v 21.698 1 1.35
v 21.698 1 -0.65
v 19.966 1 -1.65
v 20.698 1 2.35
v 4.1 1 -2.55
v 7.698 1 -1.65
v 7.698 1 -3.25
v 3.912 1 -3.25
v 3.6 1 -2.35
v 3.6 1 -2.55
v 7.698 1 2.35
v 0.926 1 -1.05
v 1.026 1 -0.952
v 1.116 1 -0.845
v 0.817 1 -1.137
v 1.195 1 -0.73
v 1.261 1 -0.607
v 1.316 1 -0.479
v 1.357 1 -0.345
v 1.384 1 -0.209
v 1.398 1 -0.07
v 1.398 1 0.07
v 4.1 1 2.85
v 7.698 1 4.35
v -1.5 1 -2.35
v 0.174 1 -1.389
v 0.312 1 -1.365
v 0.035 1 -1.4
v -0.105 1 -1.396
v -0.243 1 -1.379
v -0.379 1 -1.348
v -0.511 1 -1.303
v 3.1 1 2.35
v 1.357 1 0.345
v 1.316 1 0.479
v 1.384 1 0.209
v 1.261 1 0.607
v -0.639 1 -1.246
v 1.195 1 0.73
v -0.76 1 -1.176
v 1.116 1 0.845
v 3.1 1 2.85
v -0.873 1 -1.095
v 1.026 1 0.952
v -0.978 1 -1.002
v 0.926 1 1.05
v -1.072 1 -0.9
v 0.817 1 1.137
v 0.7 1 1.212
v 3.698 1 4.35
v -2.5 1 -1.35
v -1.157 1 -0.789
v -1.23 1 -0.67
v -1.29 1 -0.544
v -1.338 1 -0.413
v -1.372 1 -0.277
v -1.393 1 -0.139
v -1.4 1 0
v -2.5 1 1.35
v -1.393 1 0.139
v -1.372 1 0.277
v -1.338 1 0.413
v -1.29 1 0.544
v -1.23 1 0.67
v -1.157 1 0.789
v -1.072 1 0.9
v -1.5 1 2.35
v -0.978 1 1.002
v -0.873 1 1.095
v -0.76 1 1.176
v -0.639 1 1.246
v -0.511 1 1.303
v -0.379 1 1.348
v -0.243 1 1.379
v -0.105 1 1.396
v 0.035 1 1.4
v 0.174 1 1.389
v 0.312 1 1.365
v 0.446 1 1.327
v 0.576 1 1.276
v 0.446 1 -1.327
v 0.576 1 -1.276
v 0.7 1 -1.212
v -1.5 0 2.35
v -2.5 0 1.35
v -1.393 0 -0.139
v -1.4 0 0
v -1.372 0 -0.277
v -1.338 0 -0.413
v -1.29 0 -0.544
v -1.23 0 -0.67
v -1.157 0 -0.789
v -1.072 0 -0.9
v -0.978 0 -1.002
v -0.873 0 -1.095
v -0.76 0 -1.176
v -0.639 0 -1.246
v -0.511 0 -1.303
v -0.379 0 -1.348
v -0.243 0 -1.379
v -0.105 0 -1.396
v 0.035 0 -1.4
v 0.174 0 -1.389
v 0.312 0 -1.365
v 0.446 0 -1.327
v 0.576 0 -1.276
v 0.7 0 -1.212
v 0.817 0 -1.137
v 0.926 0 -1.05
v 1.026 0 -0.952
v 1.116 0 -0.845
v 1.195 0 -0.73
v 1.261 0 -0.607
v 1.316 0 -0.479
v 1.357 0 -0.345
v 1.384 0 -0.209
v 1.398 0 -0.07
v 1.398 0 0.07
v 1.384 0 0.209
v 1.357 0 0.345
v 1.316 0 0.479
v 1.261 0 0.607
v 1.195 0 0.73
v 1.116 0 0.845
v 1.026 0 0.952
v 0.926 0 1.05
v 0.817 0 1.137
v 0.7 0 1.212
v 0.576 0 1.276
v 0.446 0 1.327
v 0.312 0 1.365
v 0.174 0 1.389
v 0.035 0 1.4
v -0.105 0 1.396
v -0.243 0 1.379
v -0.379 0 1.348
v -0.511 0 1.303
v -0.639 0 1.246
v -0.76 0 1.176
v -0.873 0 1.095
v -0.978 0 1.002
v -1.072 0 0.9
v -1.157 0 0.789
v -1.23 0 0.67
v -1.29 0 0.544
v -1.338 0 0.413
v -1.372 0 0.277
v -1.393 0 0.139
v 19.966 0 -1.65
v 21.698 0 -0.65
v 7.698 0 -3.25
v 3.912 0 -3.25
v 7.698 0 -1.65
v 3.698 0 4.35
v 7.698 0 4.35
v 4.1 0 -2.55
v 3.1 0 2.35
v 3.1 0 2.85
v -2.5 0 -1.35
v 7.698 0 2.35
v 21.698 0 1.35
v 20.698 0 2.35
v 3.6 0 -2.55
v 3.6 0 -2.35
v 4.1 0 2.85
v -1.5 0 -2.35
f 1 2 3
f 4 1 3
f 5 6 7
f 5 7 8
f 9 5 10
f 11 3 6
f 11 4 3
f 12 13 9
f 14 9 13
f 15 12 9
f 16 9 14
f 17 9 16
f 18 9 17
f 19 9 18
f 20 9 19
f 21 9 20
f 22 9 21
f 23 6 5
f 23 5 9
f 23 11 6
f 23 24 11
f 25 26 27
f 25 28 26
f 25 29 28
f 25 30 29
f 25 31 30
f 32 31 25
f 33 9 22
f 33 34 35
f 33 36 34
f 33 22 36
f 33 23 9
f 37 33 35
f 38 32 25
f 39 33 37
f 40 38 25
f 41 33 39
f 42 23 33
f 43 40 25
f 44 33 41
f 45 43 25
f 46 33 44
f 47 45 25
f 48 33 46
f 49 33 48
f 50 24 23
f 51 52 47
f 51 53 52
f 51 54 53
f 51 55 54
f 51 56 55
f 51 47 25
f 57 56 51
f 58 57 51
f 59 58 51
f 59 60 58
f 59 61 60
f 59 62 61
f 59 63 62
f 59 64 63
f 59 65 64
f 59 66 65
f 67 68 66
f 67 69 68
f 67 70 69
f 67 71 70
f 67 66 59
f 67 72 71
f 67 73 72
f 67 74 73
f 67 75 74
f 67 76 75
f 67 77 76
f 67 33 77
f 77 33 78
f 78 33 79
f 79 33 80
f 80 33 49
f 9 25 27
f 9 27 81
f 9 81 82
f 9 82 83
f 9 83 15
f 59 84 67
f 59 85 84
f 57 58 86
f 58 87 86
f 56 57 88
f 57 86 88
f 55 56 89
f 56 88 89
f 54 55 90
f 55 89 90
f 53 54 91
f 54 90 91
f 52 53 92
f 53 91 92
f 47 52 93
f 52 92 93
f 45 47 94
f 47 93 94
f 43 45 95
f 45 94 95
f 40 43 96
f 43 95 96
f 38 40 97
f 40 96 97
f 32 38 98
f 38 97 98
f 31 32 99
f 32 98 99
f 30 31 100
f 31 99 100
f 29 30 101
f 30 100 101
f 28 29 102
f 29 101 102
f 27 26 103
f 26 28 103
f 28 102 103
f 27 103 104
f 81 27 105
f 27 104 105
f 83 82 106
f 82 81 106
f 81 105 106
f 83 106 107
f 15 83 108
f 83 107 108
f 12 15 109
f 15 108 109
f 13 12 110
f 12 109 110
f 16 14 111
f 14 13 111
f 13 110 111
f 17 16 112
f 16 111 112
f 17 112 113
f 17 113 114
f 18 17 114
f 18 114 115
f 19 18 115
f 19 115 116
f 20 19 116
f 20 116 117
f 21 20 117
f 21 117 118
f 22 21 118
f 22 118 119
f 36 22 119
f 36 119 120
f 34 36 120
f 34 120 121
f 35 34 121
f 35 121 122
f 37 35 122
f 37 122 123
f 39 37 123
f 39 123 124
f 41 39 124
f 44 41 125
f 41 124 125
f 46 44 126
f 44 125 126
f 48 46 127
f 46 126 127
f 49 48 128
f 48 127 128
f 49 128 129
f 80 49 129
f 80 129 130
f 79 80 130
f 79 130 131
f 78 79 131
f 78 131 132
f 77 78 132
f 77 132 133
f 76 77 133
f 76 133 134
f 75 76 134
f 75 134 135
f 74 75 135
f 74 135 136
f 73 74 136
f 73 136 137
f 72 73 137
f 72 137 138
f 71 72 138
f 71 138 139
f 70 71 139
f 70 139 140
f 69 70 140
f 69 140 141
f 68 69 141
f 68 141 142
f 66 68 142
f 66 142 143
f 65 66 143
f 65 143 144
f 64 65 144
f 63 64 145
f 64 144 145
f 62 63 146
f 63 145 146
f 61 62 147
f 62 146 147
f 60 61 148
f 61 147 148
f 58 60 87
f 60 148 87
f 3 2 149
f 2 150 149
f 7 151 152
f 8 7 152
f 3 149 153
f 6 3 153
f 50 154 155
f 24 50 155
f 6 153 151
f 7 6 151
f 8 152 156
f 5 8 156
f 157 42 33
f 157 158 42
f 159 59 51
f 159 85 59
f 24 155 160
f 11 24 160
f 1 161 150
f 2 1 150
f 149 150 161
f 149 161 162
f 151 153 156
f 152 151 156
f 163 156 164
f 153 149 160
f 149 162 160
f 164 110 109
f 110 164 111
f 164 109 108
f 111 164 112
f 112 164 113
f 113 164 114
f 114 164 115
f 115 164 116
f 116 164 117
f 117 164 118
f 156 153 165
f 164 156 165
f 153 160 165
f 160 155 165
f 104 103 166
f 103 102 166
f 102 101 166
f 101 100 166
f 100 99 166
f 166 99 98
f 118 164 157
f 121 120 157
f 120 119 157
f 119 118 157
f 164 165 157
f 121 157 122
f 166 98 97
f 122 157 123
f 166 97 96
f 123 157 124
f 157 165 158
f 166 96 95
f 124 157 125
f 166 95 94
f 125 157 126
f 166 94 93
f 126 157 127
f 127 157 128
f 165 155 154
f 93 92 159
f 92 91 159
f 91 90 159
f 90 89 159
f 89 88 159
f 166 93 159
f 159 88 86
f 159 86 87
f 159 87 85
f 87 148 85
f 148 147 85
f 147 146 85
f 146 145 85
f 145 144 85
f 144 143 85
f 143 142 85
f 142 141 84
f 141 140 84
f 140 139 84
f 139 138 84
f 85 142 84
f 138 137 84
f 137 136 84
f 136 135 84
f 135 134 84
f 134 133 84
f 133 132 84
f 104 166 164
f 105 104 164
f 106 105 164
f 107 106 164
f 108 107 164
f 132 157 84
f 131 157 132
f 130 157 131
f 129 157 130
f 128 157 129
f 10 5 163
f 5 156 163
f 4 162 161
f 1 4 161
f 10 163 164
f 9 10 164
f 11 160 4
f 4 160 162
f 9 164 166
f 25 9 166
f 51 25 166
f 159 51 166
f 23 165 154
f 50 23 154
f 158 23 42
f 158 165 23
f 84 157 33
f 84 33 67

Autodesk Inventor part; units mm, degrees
ref_plane "YZ Plane" through (0, 0, 0) normal (1, 0, 0) x (0, 1, 0)
ref_plane "XZ Plane" through (0, 0, 0) normal (0, 1, 0) x (-1, 0, 0)
ref_plane "XY Plane" through (0, 0, 0) normal (0, 0, 1) x (1, 0, 0)
sketch "Sketch1" plane through (0, 0, 0) normal (0, 1, 0) x (-1, 0, 0)
  line L0 (-4.1, 2.85) -> (-3.1, 2.85)
  line L1 (-3.1, 2.85) -> (-3.1, 2.35)
  line L2 (-3.1, 2.35) -> (2.5, 2.35)
  line L3 (2.5, 2.35) -> (2.5, -2.35)
  line L4 (-4.1, 2.85) -> (-3.6981, 4.35)
  line L5 (-3.6981, 4.35) -> (-7.6981, 4.35)
  line L6 (-7.6981, 4.35) -> (-7.6981, 2.35)
  line L7 (-7.6981, 2.35) -> (-20.6981, 2.35)
  line L8 (-20.6981, 2.35) -> (-21.6981, 1.35)
  line L9 (-21.6981, 1.35) -> (-21.6981, -0.65)
  line L10 (-21.6981, -0.65) -> (-19.966, -1.65)
  line L11 (-19.966, -1.65) -> (-7.6981, -1.65)
  line L12 (-7.6981, -1.65) -> (-7.6981, -3.25)
  line L13 (-7.6981, -3.25) -> (-3.9124, -3.25)
  line L14 (-3.9124, -3.25) -> (-4.1, -2.55)
  line L15 (-4.1, -2.55) -> (-3.6, -2.55)
  line L16 (-3.6, -2.55) -> (-3.6, -2.35)
  line L17 (-3.6, -2.35) -> (2.5, -2.35)
  circle A0 centre (0, 0) radius 1.4
  dimension "d1" = 4
  dimension "d2" = 2
  dimension "d3" = 75
  dimension "d4" = 4.7
  dimension "d5" = 5.6
  dimension "d6" = 1
  dimension "d7" = 0.5
  dimension "d8" = 75
  dimension "d9" = 7.6
  dimension "d10" = 2
  dimension "d11" = 0.5
  dimension "d12" = 0.2
  dimension "d13" = 2.8
  dimension "d14" = 2.5
  dimension "d15" = 2.35
  dimension "d17" = 0
  dimension "d18" = 0
  dimension "d19" = 4
  dimension "d20" = 0
  dimension "d21" = 0
  dimension "d23" = 2
  dimension "d24" = 60
  dimension "d25" = 45
  dimension "d26" = 14
  dimension "d27" = 1
extrude "Plate1" add sketch "Sketch1" along normal blind 1
chamfer "Corner Chamfer1" distance 1 angle 45 2 edges at (-2.5, 0.5, 2.35) (-2.5, 0.5, -2.35)
equation "\"d8\" = d3"
equation "\"d15\" = 0.5 * d4"
equation "\"d31\" = Thickness"
equation "\"BendRadius\" = Thickness"
equation "\"BendReliefWidth\" = Thickness"
equation "\"BendReliefDepth\" = 0.5 * Thickness"
equation "\"CornerReliefSize\" = 4 * Thickness"
equation "\"MinimumRemnant\" = 2 * Thickness"
equation "\"TransitionRadius\" = BendRadius"
equation "\"JacobiRadiusSize\" = BendRadius"
equation "\"GapSize\" = Thickness"
equation "\"d16\" = BendRadius"
equation "\"Thickness\" = 1"
properties part number "PlacaTerraPlug" material "Steel, Galvanized"
